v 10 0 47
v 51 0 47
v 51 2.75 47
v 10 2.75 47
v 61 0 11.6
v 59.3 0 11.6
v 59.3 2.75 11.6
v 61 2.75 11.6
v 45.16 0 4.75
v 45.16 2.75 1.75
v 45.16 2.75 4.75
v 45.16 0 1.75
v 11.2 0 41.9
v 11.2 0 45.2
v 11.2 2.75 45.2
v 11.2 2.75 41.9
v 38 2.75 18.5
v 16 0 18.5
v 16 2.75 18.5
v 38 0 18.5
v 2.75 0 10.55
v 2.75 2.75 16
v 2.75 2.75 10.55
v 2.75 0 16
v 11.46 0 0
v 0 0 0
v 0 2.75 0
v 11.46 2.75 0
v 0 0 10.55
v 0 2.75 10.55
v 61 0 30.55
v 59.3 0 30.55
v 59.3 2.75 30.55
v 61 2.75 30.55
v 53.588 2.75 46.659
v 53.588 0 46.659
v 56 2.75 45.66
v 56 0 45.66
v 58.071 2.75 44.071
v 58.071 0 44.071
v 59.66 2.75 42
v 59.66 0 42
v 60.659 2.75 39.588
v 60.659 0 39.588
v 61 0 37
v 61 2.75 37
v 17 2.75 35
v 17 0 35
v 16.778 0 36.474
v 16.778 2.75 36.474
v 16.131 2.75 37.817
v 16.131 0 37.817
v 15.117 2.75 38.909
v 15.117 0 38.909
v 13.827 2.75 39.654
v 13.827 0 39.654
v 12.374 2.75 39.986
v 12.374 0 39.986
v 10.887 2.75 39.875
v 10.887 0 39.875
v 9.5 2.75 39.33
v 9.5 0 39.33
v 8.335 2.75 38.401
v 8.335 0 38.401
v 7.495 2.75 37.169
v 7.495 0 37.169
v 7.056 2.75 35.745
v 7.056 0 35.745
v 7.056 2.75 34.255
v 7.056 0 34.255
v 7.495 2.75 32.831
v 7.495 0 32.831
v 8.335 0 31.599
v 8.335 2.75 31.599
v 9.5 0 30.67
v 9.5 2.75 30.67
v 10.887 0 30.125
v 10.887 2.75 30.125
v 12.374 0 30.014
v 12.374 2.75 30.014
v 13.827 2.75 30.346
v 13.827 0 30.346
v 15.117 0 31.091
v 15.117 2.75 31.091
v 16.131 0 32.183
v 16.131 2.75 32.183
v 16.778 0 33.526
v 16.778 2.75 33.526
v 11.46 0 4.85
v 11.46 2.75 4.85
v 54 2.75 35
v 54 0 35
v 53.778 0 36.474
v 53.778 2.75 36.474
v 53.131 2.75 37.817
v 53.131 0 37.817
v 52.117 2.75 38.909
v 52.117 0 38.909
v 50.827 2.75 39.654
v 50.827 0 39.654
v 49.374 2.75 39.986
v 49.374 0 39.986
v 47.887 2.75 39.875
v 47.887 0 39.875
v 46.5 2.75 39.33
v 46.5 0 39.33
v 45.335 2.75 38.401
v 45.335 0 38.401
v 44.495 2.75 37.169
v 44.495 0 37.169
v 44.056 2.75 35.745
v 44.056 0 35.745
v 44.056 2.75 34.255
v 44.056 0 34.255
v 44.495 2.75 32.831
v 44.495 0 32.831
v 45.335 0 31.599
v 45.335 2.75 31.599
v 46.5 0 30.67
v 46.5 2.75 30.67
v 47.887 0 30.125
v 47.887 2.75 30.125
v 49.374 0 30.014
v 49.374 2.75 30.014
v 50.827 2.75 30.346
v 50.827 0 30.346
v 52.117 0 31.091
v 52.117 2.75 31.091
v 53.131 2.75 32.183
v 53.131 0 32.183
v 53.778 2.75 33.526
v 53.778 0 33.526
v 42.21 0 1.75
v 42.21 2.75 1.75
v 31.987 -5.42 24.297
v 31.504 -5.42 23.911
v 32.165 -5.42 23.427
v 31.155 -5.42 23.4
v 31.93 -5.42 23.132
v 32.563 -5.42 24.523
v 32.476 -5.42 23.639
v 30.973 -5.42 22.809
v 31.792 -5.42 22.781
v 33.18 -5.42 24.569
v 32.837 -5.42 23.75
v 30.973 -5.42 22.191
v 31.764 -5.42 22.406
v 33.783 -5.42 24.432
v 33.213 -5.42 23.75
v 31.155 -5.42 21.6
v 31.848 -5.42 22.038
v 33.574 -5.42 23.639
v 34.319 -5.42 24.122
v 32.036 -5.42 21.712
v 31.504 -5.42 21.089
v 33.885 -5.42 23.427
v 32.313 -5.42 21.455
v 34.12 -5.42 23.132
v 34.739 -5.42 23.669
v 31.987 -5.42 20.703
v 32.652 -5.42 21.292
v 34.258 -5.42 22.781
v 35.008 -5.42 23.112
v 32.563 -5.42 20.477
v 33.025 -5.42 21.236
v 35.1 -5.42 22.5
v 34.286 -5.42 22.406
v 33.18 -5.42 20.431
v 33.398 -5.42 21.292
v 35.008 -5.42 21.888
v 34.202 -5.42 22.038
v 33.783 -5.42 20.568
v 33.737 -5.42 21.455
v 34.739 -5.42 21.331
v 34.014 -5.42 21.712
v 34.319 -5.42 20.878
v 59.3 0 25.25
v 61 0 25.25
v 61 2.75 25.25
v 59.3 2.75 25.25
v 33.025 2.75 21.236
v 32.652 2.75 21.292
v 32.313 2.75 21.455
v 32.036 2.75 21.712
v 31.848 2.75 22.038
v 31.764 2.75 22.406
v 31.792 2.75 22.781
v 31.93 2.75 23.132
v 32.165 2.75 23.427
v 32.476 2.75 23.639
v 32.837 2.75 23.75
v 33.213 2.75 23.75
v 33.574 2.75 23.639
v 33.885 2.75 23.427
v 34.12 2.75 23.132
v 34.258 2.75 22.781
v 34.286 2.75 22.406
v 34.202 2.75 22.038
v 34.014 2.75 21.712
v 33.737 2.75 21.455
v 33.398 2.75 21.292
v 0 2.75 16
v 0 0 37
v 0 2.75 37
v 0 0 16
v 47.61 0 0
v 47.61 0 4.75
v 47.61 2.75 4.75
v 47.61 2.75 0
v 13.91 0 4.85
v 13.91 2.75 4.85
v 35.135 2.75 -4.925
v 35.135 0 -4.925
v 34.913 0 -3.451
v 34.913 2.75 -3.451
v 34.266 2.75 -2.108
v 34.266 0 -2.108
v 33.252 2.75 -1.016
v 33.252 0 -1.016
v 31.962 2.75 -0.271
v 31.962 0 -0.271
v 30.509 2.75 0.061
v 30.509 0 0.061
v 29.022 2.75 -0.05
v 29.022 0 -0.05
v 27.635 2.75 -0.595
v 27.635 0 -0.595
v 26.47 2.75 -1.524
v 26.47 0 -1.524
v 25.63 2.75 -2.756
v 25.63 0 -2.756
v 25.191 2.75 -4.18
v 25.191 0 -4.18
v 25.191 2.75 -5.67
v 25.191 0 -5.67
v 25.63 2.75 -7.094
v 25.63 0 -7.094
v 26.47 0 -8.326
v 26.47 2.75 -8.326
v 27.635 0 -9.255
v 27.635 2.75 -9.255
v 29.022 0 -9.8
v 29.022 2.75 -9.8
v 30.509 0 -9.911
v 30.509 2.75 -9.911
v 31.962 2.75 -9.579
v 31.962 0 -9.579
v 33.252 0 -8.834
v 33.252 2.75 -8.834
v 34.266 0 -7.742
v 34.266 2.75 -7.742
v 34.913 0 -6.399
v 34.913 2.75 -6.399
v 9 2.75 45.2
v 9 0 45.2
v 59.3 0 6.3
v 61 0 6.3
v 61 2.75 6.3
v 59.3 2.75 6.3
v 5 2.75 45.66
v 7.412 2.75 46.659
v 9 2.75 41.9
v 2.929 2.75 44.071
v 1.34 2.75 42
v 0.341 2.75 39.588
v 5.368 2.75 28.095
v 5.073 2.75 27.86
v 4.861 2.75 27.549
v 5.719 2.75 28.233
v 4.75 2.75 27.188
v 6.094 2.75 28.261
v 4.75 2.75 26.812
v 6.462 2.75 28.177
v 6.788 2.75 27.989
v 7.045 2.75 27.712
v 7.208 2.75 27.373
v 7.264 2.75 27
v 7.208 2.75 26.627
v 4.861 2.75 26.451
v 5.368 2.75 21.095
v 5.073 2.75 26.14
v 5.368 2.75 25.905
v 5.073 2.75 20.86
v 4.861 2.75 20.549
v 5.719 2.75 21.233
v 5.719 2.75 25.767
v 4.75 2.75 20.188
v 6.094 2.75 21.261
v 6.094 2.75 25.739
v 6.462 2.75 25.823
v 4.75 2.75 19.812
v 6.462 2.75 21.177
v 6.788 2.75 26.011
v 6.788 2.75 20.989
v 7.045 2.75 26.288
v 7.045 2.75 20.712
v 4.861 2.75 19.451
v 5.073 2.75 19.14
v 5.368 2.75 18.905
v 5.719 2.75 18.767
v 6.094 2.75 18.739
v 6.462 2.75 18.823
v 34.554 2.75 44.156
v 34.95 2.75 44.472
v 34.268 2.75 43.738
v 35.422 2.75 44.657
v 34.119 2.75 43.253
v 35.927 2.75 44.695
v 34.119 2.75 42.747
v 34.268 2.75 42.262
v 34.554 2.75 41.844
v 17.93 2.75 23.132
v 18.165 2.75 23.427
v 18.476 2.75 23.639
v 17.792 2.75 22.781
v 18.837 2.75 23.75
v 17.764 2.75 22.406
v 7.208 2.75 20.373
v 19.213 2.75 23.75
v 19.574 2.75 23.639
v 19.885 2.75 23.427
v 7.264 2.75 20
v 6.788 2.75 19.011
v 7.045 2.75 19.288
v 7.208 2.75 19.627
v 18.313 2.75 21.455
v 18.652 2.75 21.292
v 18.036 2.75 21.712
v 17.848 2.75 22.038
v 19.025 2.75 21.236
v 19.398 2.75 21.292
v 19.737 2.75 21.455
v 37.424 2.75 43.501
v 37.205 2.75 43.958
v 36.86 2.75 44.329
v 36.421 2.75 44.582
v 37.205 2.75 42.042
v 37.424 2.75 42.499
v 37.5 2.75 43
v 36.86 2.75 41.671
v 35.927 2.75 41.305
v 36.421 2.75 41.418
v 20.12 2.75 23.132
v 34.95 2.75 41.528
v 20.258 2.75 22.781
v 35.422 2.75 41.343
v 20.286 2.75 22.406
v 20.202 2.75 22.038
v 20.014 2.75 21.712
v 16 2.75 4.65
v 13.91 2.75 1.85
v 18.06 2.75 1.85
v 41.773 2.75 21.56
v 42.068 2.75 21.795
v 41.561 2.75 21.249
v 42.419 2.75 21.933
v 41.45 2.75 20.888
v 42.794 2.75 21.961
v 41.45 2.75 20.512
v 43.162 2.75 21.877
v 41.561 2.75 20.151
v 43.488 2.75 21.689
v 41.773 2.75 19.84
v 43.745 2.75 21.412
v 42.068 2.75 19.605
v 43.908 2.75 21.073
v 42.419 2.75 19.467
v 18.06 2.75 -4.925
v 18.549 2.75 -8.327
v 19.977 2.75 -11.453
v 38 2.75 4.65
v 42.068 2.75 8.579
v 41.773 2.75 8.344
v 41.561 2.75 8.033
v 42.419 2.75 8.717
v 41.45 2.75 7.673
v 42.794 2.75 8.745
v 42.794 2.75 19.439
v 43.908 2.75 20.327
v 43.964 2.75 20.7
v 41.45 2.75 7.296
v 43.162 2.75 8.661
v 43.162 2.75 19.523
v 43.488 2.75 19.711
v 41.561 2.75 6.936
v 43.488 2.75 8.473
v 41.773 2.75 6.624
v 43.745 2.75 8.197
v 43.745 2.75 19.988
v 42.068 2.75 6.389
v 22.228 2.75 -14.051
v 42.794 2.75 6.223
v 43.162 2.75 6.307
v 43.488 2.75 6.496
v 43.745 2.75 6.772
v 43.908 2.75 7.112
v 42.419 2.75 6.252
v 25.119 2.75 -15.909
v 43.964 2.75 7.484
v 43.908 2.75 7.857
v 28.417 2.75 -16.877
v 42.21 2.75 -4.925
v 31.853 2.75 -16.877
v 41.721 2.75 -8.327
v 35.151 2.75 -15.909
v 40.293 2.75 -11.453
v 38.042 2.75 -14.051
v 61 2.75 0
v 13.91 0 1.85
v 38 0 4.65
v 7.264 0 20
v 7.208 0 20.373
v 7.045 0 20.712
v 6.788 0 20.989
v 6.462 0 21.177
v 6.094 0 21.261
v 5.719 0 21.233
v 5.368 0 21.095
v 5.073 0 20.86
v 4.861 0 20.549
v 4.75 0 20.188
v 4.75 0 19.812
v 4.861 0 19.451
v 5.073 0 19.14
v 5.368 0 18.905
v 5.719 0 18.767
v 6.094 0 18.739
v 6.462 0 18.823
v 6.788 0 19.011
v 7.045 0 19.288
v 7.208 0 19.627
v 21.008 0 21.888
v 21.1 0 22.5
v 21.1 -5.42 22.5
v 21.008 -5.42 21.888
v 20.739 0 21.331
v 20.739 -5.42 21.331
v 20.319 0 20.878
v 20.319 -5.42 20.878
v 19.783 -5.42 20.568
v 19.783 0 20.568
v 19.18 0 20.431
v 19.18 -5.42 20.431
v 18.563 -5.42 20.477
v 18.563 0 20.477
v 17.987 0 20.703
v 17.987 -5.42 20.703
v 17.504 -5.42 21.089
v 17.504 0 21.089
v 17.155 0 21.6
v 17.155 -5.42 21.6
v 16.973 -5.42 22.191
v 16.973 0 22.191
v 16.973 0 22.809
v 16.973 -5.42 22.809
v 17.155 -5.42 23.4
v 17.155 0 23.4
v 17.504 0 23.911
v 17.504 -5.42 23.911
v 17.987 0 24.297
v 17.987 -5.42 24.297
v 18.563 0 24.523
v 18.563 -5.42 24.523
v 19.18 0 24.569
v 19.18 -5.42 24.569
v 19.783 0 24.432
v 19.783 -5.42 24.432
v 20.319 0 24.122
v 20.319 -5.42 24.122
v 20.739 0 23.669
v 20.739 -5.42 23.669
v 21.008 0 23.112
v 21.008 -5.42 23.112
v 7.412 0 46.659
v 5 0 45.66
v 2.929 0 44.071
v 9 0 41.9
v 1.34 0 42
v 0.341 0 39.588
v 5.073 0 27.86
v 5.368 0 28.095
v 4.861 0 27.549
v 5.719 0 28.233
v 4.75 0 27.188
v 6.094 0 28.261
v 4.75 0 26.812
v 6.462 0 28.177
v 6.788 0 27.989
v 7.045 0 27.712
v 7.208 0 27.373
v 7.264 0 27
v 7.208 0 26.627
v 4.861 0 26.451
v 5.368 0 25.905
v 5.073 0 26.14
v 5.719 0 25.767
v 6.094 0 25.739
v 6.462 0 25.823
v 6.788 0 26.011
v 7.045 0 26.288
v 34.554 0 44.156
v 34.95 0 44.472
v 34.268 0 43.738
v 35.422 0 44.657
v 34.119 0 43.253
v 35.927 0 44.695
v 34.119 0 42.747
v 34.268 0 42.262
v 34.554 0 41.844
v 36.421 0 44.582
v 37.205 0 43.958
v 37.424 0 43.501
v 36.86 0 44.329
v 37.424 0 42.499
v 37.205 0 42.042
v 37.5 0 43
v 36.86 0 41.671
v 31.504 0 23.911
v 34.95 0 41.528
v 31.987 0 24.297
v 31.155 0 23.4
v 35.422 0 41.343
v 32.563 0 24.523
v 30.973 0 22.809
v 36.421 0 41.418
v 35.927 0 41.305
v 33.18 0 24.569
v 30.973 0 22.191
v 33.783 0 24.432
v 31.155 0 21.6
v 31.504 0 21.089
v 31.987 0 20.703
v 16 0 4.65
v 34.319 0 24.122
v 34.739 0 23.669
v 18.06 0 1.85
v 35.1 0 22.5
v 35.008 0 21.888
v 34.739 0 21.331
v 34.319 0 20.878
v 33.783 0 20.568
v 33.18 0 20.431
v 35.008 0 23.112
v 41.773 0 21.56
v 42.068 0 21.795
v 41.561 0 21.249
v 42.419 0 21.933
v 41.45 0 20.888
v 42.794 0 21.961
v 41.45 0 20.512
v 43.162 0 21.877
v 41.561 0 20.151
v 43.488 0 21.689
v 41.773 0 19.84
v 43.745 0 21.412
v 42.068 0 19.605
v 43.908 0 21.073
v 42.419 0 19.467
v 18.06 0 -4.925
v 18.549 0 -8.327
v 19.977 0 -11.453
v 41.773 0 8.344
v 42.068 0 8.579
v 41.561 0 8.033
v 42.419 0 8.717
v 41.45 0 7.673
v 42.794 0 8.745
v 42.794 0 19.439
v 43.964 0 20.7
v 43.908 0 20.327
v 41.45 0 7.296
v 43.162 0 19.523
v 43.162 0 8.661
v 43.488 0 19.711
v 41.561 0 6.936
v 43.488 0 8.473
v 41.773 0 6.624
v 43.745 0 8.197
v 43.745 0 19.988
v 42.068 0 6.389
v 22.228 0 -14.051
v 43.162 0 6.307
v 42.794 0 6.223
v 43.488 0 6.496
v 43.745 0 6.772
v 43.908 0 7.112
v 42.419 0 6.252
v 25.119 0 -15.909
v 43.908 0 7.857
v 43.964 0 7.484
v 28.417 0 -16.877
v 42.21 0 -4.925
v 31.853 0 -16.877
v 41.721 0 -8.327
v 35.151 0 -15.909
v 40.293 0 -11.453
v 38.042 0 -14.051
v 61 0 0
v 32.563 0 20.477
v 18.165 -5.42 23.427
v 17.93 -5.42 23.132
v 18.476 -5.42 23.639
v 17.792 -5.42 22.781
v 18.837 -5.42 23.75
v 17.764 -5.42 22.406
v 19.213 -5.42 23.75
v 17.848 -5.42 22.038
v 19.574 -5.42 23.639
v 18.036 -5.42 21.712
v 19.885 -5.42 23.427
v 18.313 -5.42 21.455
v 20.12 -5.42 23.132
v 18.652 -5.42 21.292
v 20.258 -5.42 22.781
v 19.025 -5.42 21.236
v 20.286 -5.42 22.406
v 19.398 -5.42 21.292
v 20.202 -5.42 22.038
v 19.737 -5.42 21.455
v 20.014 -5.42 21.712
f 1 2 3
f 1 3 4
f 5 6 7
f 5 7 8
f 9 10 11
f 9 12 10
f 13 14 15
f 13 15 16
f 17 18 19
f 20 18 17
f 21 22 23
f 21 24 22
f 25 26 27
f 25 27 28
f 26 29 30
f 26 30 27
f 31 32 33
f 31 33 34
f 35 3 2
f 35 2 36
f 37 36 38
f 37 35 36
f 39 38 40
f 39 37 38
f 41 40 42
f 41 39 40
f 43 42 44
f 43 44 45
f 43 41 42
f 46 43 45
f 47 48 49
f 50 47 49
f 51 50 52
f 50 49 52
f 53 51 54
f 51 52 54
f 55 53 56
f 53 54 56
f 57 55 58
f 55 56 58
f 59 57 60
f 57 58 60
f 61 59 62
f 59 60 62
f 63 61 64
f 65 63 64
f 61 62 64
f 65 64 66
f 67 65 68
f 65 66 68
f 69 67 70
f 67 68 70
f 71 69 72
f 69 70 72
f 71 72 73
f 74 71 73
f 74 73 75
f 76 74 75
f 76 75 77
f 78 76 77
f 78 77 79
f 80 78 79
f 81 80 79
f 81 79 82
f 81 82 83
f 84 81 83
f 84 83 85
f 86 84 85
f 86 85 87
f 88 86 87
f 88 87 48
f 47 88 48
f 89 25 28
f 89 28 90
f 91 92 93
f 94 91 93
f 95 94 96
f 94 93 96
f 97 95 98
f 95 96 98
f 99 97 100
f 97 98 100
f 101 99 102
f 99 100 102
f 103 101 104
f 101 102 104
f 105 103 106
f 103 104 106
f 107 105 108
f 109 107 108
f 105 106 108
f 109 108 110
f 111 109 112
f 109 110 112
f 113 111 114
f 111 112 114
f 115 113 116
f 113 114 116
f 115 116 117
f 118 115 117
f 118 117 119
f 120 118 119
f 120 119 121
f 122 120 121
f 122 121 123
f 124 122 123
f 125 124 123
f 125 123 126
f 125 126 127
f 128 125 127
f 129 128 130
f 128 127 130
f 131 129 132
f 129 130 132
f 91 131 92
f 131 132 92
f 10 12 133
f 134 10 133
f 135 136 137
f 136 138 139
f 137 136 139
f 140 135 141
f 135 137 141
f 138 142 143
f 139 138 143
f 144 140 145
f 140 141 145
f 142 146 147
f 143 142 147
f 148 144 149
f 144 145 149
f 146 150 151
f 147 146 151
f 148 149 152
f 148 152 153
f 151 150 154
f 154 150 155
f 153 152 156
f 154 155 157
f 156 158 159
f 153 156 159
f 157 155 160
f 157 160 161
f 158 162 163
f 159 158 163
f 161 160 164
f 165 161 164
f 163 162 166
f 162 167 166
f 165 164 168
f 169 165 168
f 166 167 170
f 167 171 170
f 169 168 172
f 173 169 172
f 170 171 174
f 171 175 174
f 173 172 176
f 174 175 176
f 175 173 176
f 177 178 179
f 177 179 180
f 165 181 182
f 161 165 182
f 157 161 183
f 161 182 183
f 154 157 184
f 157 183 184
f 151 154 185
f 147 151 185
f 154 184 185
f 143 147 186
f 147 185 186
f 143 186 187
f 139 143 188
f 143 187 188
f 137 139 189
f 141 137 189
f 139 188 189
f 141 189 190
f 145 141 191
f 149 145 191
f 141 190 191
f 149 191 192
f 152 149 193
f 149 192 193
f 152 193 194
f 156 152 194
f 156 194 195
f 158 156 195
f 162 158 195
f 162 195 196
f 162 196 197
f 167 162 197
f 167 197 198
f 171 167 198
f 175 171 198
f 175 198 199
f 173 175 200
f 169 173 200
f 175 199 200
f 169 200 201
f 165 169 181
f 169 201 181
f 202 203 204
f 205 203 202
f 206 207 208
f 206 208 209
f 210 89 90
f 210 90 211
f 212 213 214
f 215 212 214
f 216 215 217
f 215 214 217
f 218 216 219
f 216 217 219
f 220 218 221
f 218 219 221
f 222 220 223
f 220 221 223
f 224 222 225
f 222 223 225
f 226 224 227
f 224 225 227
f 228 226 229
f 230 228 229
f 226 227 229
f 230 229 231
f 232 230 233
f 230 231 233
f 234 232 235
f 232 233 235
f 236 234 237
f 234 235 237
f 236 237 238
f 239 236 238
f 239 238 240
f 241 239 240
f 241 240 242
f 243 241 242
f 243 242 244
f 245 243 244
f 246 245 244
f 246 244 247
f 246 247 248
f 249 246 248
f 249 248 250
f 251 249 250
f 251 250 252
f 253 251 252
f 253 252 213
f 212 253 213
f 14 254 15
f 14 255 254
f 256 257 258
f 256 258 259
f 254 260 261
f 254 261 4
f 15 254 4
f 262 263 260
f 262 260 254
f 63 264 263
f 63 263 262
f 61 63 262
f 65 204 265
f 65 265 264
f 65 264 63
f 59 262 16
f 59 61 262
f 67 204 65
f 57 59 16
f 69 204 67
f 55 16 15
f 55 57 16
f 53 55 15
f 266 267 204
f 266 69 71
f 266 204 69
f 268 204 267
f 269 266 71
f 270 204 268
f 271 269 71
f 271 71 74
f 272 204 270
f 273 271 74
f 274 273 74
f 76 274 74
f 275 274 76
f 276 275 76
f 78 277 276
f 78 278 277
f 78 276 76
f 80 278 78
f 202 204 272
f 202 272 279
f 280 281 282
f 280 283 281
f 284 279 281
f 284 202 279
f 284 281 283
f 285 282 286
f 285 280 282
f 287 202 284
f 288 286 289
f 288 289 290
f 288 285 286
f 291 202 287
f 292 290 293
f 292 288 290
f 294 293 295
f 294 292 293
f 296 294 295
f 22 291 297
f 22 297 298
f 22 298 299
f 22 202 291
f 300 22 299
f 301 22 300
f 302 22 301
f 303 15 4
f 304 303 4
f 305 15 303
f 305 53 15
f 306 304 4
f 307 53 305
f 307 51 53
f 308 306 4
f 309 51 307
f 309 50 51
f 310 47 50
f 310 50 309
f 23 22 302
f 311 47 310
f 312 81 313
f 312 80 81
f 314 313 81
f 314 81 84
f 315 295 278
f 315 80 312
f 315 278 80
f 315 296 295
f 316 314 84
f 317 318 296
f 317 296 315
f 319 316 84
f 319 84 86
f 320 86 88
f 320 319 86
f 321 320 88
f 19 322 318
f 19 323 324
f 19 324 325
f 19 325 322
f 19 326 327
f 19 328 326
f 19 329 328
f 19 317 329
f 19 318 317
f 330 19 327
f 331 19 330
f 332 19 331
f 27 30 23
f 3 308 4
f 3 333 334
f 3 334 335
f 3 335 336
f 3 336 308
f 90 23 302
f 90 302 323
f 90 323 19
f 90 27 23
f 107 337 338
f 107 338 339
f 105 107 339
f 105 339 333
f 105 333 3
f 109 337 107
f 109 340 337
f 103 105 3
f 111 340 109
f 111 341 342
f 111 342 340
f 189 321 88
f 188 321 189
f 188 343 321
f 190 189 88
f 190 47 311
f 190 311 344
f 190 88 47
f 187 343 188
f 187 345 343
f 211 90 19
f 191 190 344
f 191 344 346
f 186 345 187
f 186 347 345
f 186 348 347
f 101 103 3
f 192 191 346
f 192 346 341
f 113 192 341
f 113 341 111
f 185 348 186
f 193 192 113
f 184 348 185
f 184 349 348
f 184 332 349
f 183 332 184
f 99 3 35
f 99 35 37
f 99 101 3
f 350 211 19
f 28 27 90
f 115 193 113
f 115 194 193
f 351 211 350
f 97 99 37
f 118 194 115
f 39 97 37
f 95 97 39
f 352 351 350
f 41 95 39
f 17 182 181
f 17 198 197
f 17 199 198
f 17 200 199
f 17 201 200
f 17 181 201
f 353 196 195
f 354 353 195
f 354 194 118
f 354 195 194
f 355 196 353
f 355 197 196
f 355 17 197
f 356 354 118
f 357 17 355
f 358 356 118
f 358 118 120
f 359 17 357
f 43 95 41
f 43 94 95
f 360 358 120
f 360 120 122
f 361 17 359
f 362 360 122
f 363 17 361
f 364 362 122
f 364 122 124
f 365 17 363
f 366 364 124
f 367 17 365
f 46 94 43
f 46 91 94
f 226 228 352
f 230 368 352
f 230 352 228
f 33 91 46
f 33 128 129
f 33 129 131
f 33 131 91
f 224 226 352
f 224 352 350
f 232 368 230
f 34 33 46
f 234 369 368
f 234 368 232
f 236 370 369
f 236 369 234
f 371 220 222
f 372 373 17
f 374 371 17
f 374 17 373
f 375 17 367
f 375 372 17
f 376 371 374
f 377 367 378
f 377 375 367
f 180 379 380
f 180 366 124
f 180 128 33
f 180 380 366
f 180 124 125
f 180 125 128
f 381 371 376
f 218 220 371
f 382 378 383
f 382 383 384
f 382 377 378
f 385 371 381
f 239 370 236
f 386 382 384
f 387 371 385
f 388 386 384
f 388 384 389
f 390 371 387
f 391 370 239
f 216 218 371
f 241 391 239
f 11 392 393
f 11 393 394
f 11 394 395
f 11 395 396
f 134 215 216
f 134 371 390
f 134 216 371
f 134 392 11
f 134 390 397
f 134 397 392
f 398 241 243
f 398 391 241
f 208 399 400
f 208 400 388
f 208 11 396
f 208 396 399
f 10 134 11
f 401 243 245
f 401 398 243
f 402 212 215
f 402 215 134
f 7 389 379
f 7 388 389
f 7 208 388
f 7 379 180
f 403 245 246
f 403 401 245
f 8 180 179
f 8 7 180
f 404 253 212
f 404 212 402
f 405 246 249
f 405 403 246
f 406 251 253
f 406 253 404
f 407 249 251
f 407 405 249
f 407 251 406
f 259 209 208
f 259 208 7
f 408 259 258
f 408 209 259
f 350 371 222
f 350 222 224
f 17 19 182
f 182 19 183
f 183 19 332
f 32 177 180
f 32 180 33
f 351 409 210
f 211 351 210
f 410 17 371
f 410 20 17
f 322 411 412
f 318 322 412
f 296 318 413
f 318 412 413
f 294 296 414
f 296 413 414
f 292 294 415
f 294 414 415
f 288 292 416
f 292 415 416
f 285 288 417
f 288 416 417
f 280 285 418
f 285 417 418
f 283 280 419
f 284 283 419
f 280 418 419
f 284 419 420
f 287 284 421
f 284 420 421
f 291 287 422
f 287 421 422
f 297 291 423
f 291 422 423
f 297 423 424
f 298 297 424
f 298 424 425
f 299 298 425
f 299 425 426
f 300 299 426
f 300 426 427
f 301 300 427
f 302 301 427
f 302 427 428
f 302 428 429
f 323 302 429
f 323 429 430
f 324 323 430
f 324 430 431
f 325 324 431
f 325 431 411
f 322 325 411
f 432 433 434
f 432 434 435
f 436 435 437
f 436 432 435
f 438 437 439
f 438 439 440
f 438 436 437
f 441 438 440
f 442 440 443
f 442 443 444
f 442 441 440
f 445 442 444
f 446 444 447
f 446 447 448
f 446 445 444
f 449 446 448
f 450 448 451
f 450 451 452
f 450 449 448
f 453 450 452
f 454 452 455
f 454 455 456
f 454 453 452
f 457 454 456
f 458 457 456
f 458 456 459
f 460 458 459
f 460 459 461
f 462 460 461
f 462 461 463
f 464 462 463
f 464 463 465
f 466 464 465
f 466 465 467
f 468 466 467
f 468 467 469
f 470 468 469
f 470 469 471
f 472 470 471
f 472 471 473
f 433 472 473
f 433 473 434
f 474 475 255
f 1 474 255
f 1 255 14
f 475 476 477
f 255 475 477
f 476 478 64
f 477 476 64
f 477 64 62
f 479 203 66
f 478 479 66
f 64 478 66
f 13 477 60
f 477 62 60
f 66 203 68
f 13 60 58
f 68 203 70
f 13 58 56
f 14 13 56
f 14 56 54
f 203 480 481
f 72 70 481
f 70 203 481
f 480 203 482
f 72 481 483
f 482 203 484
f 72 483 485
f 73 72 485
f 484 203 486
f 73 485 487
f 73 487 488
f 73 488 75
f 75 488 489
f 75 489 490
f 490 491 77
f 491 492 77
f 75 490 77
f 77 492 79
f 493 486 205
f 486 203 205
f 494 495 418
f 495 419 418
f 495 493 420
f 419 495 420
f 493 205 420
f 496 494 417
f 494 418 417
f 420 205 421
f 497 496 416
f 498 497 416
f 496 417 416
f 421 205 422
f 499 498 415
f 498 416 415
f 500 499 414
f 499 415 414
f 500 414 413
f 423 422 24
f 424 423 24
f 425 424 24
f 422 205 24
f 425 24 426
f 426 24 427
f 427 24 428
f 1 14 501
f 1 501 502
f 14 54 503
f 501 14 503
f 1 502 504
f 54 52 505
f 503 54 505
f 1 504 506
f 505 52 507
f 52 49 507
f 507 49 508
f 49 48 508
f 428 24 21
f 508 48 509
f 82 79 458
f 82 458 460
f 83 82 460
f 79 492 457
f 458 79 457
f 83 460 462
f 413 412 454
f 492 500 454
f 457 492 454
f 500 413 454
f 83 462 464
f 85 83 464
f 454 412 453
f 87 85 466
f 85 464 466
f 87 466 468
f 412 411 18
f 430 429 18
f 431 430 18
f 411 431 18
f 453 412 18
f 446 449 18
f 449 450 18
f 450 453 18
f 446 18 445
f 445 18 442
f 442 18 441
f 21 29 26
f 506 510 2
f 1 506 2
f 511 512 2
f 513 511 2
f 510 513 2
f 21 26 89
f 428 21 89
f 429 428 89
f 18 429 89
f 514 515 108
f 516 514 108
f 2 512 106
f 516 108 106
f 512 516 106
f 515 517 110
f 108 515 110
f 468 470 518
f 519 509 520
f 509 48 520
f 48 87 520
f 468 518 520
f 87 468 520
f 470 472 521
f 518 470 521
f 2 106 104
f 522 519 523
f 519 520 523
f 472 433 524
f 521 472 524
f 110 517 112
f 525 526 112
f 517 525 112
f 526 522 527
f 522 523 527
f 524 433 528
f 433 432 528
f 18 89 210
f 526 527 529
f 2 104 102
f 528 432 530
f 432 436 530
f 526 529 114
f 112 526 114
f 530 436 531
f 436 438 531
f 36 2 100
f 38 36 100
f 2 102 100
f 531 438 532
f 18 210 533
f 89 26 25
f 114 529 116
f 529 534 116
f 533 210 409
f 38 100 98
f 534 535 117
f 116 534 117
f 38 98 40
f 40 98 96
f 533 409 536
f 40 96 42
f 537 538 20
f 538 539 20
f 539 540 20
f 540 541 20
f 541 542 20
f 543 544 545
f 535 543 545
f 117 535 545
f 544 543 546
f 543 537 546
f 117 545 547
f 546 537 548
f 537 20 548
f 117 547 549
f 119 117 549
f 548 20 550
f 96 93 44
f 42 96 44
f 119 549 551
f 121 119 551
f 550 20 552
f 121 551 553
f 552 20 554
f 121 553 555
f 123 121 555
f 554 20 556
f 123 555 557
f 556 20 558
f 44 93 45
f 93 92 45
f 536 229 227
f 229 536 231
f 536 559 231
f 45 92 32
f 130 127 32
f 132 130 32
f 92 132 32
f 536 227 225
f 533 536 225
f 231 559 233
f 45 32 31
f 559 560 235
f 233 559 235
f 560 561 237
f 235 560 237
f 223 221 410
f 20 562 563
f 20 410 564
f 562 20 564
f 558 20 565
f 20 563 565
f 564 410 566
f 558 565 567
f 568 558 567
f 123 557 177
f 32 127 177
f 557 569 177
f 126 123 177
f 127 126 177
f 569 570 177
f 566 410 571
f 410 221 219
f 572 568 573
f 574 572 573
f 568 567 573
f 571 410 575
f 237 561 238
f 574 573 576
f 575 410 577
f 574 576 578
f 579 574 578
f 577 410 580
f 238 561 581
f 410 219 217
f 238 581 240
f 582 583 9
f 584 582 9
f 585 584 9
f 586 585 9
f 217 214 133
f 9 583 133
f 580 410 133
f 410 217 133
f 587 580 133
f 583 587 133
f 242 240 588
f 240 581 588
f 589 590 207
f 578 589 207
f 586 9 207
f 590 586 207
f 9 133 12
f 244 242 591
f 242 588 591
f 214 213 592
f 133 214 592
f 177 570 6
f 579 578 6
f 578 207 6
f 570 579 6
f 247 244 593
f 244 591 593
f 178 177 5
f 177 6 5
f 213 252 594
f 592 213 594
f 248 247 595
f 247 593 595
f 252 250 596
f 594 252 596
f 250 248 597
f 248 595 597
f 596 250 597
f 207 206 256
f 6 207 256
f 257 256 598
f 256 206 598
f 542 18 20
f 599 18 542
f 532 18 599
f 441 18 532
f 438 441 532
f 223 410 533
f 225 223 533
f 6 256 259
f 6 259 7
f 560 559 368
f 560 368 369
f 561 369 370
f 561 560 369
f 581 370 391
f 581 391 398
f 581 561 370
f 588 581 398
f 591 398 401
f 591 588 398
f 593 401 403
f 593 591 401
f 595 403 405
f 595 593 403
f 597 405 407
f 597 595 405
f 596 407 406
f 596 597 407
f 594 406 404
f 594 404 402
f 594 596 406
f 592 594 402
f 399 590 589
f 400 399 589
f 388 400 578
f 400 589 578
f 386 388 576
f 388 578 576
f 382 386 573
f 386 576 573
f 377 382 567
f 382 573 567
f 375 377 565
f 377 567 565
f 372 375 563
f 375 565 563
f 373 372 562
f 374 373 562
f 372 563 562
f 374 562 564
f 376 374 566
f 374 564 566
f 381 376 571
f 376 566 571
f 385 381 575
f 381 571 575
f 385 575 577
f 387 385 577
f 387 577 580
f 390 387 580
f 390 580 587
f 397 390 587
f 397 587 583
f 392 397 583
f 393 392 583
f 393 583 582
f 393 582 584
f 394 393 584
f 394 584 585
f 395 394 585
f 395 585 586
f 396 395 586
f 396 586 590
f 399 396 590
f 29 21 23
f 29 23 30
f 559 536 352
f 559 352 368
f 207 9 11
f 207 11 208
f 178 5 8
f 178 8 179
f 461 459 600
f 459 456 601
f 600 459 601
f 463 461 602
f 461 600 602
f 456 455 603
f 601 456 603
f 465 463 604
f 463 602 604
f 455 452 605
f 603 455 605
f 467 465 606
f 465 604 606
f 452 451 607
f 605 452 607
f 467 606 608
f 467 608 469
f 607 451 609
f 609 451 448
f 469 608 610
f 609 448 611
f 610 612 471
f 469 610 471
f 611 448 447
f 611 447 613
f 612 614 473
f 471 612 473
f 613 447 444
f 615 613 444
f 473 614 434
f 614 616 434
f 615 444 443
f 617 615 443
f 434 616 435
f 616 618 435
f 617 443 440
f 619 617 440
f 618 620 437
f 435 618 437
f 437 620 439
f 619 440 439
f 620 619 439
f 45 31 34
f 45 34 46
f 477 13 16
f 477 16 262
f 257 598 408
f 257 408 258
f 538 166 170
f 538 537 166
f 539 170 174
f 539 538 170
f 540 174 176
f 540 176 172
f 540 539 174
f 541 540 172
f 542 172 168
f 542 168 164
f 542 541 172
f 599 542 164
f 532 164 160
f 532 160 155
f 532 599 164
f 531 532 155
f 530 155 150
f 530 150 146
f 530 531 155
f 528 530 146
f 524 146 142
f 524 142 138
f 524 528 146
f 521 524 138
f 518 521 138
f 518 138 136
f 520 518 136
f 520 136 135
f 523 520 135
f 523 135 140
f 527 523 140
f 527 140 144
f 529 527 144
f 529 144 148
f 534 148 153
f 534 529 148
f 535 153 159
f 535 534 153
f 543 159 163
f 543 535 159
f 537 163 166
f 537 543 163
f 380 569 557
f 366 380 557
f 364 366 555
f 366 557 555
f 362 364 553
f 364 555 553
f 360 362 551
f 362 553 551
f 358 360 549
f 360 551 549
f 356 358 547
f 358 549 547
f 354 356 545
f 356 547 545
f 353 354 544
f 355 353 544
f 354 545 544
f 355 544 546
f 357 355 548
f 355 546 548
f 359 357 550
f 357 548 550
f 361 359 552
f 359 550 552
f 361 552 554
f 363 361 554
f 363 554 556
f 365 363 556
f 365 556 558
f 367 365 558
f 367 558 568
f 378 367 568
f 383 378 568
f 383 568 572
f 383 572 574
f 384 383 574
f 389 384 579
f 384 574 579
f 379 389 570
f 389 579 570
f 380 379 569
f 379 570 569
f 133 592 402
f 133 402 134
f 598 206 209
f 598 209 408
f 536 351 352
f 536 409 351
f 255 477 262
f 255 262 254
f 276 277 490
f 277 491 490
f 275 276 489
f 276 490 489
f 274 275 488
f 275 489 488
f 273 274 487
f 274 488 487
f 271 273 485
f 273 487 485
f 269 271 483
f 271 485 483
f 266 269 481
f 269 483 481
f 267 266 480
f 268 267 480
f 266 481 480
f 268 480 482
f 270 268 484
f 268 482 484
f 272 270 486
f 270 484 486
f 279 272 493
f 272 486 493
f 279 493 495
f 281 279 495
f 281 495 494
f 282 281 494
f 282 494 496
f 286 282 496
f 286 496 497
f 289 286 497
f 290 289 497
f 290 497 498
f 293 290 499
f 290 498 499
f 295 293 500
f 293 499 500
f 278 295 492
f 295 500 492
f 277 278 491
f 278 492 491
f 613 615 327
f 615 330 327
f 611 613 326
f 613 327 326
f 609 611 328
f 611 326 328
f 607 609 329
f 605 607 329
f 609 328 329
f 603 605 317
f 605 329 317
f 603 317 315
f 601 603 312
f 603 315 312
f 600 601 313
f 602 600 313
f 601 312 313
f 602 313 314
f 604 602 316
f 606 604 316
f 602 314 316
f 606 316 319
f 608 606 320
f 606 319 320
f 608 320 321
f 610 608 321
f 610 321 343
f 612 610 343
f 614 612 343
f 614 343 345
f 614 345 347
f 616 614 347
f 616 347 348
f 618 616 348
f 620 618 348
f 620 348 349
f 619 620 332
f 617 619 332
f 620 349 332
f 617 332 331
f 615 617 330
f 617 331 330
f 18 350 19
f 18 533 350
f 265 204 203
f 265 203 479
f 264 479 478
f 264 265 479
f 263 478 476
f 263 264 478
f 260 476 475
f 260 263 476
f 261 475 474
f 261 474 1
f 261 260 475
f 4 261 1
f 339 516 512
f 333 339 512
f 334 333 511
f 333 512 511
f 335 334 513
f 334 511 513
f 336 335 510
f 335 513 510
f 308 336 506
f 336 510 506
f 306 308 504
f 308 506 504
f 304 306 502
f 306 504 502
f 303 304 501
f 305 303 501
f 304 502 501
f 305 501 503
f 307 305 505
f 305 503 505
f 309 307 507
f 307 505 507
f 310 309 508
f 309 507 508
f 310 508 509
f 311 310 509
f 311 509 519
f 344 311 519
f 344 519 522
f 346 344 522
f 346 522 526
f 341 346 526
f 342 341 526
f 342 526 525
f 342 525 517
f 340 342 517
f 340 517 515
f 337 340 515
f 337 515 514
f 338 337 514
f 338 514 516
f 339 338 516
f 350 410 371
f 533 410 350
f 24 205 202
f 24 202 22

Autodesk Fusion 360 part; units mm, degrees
sketch "Sketch1" plane through (0, 0, 0) normal (0, 1, 0) x (1, 0, 0)
  line L0 (0, 0) -> (61, 0)
  line L1 (61, 0) -> (61, -47)
  line L2 (61, -47) -> (0, -47)
  line L3 (0, -47) -> (0, 0)
  circle A0 centre (12, -35) radius 5
  line L4 (0, -16) -> (2.75, -16)
  line L5 (2.75, -16) -> (2.75, -10.55)
  line L6 (2.75, -10.55) -> (0, -10.55)
  line L7 (11.46, 0) -> (11.46, -4.85)
  line L8 (11.46, -4.85) -> (13.91, -4.85)
  line L9 (13.91, -1.85) -> (13.91, -4.85)
  line L10 (18.06, 0) -> (18.06, 4.925)
  line L11 (18.06, 4.925) -> (42.21, 4.925) construction
  line L12 (42.21, 4.925) -> (42.21, 0)
  arc A1 (42.21, 4.925) -> (18.06, 4.925) centre (30.135, 4.925) ccw
  line L13 (45.16, -1.75) -> (45.16, -4.75)
  line L14 (45.16, -4.75) -> (47.61, -4.75)
  line L15 (47.61, -4.75) -> (47.61, 0)
  line L16 (61, -6.3) -> (59.3, -6.3)
  line L17 (59.3, -6.3) -> (59.3, -11.6)
  line L18 (59.3, -11.6) -> (61, -11.6)
  line L19 (61, -25.25) -> (59.3, -25.25)
  line L20 (59.3, -25.25) -> (59.3, -30.55)
  line L21 (59.3, -30.55) -> (61, -30.55)
  line L22 (16, -18.5) -> (38, -18.5)
  line L23 (38, -18.5) -> (38, -4.65)
  line L24 (38, -4.65) -> (16, -4.65)
  line L25 (16, -4.65) -> (16, -18.5)
  circle A2 centre (19.025, -22.5) radius 2.075
  circle A3 centre (33.025, -22.5) radius 2.075
  circle A4 centre (42.7, -20.7) radius 1.5
  circle A5 centre (42.7, -7.4843) radius 1.5
  circle A6 centre (35.8, -43) radius 1.7
  line L26 (13.91, -1.85) -> (18.06, -1.85)
  line L27 (18.06, -1.85) -> (18.06, 0)
  line L28 (30.135, 17) -> (48.0908, 17) construction
  line L29 (42.21, 0) -> (42.21, -1.75)
  line L30 (45.16, -1.75) -> (42.21, -1.75)
  circle A7 centre (49, -35) radius 5
  line L31 (12, -35) -> (49, -35) construction
  line L32 (42.7, -20.7) -> (42.7, -7.4843) construction
  line L33 (9, -45.2) -> (11.2, -45.2)
  line L34 (11.2, -45.2) -> (11.2, -41.9)
  line L35 (11.2, -41.9) -> (9, -41.9)
  line L36 (9, -41.9) -> (9, -45.2)
  line L37 (19.025, -22.5) -> (33.025, -22.5) construction
  circle A8 centre (6, -27) radius 1.5
  circle A9 centre (6, -20) radius 1.5
  line L38 (45.16, 0) -> (45.16, -1.75) construction
  line L39 (13.91, 0) -> (13.91, -1.85) construction
  circle A10 centre (30.135, 4.925) radius 5
  point P0 (6, -27)
  point P1 (6, -20)
  point P2 (12, -35)
  dimension "d1" = 61
  dimension "d2" = 47
  dimension "d3" = 7
  dimension "d4" = 6
  dimension "d5" = 20
  dimension "d20" = 12
  dimension "d21" = 12
  dimension "d22" = 10
  dimension "d25" = 31
  dimension "d26" = 5.45
  dimension "d28" = 2.45
  dimension "d29" = 4.85
  dimension "d30" = 3
  dimension "d32" = 24.15
  dimension "d35" = 11.46
  dimension "d37" = 4.75
  dimension "d38" = 2.45
  dimension "d39" = 13.39
  dimension "d40" = 6.3
  dimension "d41" = 5.3
  dimension "d42" = 1.7
  dimension "d43" = 1.7
  dimension "d44" = 13.65
  dimension "d47" = 5.3
  dimension "d48" = 16.45
  dimension "d49" = 3
  dimension "d50" = 14
  dimension "d51" = 22
  dimension "d52" = 13.85
  dimension "d53" = 16
  dimension "d54" = 4
  dimension "d55" = 10
  dimension "d56" = 12
  dimension "d57" = 25.2
  dimension "d58" = 4
  dimension "d59" = 13.2157
  dimension "d60" = 9
  dimension "d61" = 4.15
  dimension "d62" = 3.4
  dimension "d63" = 3
  dimension "d64" = 3
  dimension "d65" = 6
  dimension "d66" = 20
  dimension "d67" = 3
  dimension "d68" = 18.3
  dimension "d69" = 5.4
  dimension "d70" = 6.6
  dimension "d71" = 26.3
  dimension "d72" = 28.5
  dimension "d73" = 19.025
  dimension "d74" = 10
  dimension "d75" = 3.3
  dimension "d76" = 2.2
  dimension "d77" = 1.8
  dimension "d86" = 2.75
  dimension "d87" = 64
extrude "Extrude1" add sketch "Sketch1" along normal blind 2.75 contours L0 L1 L2 L3 L4 L5 L6 L7 L8 L9 L13 L14 L15 L16 L17 L18 L19 L20 L21 L26 L27 L29 L30 A10 | L0 L10 L12 A1 A10 | A2 | A3
extrude "Extrude3" add sketch "Sketch1" against normal blind 5.42 contours A2 | A3
fillet "Fillet1" radius 10 2 edges at (0, 1.375, 47) (61, 1.375, 47)
hole "Hole3" at (19.025, -5.42, 22.5) direction (0, 1, 0) diameter 3 end through all
hole "Hole4" at (33.025, -5.42, 22.5) direction (0, 1, 0) diameter 3 depth 8.17 tip angle 118
thread "Thread1" "ISO Metric profile 3.0 M3x0.5 6H" major diameter 3.086 minor diameter 2.529 pitch 0.5 angle 60 resizes the face on face at (43.1777, 1.8333, 19.2781)
thread "Thread2" "ISO Metric profile 3.0 M3x0.5 6H" major diameter 3.086 minor diameter 2.529 pitch 0.5 angle 60 resizes the face on face at (43.1063, 1.8333, 8.9282)
thread "Thread3" "ISO Metric profile 3.0 M3x0.5 6H" major diameter 3.086 minor diameter 2.529 pitch 0.5 angle 60 resizes the face on face at (19.1744, -2.6967, 23.9925)
thread "Thread4" "ISO Metric profile 3.0 M3x0.5 6H" major diameter 3.086 minor diameter 2.529 pitch 0.5 angle 60 resizes the face on face at (33.538, -2.6967, 21.0905)
thread "Thread5" "ISO Metric profile 3.0 M3x0.5 6H" major diameter 3.086 minor diameter 2.529 pitch 0.5 angle 60 resizes the face on face at (7.4925, 1.8333, 19.8506)
thread "Thread6" "ISO Metric profile 3.0 M3x0.5 6H" major diameter 3.086 minor diameter 2.529 pitch 0.5 angle 60 resizes the face on face at (7.4925, 1.8333, 26.8506)
extrude "Extrude2" [suppressed]
equation "d71 = 24.8 mm + ( d63 / 2 )"
equation "d73 = 21.1 mm - d61 / 2"
